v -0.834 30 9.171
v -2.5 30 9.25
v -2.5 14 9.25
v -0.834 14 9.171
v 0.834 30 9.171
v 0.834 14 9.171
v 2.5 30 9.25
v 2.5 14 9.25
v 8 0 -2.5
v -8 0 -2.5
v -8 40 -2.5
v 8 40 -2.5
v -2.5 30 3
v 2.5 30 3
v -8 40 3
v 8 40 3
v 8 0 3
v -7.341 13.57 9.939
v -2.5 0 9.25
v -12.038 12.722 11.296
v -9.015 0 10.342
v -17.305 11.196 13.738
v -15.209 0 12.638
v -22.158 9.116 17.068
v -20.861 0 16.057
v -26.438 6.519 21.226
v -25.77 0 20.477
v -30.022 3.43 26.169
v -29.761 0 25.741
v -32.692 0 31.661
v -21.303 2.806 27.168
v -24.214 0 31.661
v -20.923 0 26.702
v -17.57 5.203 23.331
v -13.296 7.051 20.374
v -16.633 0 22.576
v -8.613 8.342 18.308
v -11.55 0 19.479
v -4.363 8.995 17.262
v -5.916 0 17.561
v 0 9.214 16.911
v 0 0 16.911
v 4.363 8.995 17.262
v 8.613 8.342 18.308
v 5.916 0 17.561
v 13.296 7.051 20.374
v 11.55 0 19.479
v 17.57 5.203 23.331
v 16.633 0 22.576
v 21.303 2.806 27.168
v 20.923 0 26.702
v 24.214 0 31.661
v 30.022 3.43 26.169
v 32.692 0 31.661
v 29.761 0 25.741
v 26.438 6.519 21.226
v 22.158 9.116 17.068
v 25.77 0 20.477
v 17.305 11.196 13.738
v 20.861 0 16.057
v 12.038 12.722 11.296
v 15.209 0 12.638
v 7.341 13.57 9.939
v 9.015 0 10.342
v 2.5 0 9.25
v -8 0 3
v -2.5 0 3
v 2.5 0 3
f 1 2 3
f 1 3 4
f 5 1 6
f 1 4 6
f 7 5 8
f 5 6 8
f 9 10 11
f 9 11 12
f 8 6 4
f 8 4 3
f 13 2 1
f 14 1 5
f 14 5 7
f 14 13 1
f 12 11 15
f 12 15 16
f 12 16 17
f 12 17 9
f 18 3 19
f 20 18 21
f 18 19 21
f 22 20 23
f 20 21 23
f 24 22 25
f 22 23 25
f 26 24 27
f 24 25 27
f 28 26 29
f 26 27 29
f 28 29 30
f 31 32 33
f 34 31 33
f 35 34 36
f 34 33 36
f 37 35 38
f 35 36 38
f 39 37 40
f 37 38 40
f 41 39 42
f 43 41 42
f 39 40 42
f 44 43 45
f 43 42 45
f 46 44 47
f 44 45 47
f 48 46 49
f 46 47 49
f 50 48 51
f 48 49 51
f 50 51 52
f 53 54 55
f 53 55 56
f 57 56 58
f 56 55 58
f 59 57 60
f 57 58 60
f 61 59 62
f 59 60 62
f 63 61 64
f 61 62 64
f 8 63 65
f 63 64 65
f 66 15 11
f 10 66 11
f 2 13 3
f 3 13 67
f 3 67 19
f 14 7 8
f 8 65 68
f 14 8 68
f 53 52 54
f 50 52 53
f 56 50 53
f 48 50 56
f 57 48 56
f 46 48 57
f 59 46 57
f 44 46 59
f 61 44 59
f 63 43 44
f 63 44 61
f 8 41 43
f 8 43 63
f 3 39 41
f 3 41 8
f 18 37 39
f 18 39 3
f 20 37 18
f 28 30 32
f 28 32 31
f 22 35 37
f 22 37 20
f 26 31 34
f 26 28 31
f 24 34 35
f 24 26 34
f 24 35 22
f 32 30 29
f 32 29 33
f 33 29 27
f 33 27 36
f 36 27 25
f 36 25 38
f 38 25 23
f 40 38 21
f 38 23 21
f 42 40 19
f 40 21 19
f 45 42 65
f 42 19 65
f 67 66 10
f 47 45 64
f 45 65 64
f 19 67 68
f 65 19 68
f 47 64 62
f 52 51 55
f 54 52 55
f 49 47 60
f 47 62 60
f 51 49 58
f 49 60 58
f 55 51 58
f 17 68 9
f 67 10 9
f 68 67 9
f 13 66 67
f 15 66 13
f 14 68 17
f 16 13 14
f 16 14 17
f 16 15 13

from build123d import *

# Parameters (mm, degrees)
SKETCH1_W               = 16
SKETCH1_H               = 5
BOSS_EXTRUDE1_DEPTH     = 30
BOSS_EXTRUDE2_DEPTH     = 14
CUT_EXTRUDE1_DEPTH      = 33.691742077
CUT_EXTRUDE1_DEPTH_BACK = 33.691742077
BOSS_EXTRUDE3_START     = 30
SKETCH1_3_W             = 16
SKETCH1_3_H             = 5
BOSS_EXTRUDE3_DEPTH     = 10
SKETCH5_W               = 16
SKETCH5_H               = 0.5
BOSS_EXTRUDE4_DEPTH     = 40


with BuildPart() as part:
    # Sketch1 → Boss-Extrude1 (new body)
    with BuildSketch(Plane(origin=(0, 0, 0), x_dir=(1, 0, 0), z_dir=(0, 1, 0))):
        Rectangle(SKETCH1_W, SKETCH1_H)
        with BuildLine():
            Line((2.5, -9.25), (2.5, -2.5))
            Line((2.5, -2.5), (-2.5, -2.5))
            Line((-2.5, -2.5), (-2.5, -9.25))
            ThreePointArc((-2.5, -9.25), (0, -9.160600109), (2.5, -9.25))
        make_face()
    extrude(amount=BOSS_EXTRUDE1_DEPTH)

    # Sketch2 → Boss-Extrude2 (add)
    with BuildSketch(Plane(origin=(0, 0, 0), x_dir=(1, 0, 0), z_dir=(0, 1, 0))):
        with BuildLine():
            ThreePointArc((32.691742077, -31.660600109), (0, -9.160600109), (-32.691742077, -31.660600109))
            Line((-32.691742077, -31.660600109), (-24.213890642, -31.660600109))
            ThreePointArc((-24.213890642, -31.660600109), (0, -16.910600109), (24.213890642, -31.660600109))
            Line((24.213890642, -31.660600109), (32.691742077, -31.660600109))
        make_face()
    extrude(amount=BOSS_EXTRUDE2_DEPTH)

    # Sketch3 → Cut-Extrude1 (cut, two sides)
    with BuildSketch(Plane(origin=(0, 0, 0), x_dir=(0, 0, -1), z_dir=(1, 0, 0))) as cut_extrude1_sk:
        Polygon((-9.25, 14), (-31.660600109, 14), (-31.660600109, 0), align=None)
    extrude(amount=CUT_EXTRUDE1_DEPTH, mode=Mode.SUBTRACT)
    extrude(cut_extrude1_sk.sketch, amount=-CUT_EXTRUDE1_DEPTH_BACK, mode=Mode.SUBTRACT)

    # Sketch1_3 → Boss-Extrude3 (add)
    with BuildSketch(Plane(origin=(0, 0, 0), x_dir=(1, 0, 0), z_dir=(0, 1, 0)).offset(BOSS_EXTRUDE3_START)):
        Rectangle(SKETCH1_3_W, SKETCH1_3_H)
    extrude(amount=BOSS_EXTRUDE3_DEPTH)

    # Sketch5 → Boss-Extrude4 (add)
    with BuildSketch(Plane(origin=(0, 40, 0), x_dir=(1, 0, 0), z_dir=(0, 1, 0))):
        with Locations((0, -2.75)):
            Rectangle(SKETCH5_W, SKETCH5_H)
    extrude(amount=-BOSS_EXTRUDE4_DEPTH)


solid = part.part
